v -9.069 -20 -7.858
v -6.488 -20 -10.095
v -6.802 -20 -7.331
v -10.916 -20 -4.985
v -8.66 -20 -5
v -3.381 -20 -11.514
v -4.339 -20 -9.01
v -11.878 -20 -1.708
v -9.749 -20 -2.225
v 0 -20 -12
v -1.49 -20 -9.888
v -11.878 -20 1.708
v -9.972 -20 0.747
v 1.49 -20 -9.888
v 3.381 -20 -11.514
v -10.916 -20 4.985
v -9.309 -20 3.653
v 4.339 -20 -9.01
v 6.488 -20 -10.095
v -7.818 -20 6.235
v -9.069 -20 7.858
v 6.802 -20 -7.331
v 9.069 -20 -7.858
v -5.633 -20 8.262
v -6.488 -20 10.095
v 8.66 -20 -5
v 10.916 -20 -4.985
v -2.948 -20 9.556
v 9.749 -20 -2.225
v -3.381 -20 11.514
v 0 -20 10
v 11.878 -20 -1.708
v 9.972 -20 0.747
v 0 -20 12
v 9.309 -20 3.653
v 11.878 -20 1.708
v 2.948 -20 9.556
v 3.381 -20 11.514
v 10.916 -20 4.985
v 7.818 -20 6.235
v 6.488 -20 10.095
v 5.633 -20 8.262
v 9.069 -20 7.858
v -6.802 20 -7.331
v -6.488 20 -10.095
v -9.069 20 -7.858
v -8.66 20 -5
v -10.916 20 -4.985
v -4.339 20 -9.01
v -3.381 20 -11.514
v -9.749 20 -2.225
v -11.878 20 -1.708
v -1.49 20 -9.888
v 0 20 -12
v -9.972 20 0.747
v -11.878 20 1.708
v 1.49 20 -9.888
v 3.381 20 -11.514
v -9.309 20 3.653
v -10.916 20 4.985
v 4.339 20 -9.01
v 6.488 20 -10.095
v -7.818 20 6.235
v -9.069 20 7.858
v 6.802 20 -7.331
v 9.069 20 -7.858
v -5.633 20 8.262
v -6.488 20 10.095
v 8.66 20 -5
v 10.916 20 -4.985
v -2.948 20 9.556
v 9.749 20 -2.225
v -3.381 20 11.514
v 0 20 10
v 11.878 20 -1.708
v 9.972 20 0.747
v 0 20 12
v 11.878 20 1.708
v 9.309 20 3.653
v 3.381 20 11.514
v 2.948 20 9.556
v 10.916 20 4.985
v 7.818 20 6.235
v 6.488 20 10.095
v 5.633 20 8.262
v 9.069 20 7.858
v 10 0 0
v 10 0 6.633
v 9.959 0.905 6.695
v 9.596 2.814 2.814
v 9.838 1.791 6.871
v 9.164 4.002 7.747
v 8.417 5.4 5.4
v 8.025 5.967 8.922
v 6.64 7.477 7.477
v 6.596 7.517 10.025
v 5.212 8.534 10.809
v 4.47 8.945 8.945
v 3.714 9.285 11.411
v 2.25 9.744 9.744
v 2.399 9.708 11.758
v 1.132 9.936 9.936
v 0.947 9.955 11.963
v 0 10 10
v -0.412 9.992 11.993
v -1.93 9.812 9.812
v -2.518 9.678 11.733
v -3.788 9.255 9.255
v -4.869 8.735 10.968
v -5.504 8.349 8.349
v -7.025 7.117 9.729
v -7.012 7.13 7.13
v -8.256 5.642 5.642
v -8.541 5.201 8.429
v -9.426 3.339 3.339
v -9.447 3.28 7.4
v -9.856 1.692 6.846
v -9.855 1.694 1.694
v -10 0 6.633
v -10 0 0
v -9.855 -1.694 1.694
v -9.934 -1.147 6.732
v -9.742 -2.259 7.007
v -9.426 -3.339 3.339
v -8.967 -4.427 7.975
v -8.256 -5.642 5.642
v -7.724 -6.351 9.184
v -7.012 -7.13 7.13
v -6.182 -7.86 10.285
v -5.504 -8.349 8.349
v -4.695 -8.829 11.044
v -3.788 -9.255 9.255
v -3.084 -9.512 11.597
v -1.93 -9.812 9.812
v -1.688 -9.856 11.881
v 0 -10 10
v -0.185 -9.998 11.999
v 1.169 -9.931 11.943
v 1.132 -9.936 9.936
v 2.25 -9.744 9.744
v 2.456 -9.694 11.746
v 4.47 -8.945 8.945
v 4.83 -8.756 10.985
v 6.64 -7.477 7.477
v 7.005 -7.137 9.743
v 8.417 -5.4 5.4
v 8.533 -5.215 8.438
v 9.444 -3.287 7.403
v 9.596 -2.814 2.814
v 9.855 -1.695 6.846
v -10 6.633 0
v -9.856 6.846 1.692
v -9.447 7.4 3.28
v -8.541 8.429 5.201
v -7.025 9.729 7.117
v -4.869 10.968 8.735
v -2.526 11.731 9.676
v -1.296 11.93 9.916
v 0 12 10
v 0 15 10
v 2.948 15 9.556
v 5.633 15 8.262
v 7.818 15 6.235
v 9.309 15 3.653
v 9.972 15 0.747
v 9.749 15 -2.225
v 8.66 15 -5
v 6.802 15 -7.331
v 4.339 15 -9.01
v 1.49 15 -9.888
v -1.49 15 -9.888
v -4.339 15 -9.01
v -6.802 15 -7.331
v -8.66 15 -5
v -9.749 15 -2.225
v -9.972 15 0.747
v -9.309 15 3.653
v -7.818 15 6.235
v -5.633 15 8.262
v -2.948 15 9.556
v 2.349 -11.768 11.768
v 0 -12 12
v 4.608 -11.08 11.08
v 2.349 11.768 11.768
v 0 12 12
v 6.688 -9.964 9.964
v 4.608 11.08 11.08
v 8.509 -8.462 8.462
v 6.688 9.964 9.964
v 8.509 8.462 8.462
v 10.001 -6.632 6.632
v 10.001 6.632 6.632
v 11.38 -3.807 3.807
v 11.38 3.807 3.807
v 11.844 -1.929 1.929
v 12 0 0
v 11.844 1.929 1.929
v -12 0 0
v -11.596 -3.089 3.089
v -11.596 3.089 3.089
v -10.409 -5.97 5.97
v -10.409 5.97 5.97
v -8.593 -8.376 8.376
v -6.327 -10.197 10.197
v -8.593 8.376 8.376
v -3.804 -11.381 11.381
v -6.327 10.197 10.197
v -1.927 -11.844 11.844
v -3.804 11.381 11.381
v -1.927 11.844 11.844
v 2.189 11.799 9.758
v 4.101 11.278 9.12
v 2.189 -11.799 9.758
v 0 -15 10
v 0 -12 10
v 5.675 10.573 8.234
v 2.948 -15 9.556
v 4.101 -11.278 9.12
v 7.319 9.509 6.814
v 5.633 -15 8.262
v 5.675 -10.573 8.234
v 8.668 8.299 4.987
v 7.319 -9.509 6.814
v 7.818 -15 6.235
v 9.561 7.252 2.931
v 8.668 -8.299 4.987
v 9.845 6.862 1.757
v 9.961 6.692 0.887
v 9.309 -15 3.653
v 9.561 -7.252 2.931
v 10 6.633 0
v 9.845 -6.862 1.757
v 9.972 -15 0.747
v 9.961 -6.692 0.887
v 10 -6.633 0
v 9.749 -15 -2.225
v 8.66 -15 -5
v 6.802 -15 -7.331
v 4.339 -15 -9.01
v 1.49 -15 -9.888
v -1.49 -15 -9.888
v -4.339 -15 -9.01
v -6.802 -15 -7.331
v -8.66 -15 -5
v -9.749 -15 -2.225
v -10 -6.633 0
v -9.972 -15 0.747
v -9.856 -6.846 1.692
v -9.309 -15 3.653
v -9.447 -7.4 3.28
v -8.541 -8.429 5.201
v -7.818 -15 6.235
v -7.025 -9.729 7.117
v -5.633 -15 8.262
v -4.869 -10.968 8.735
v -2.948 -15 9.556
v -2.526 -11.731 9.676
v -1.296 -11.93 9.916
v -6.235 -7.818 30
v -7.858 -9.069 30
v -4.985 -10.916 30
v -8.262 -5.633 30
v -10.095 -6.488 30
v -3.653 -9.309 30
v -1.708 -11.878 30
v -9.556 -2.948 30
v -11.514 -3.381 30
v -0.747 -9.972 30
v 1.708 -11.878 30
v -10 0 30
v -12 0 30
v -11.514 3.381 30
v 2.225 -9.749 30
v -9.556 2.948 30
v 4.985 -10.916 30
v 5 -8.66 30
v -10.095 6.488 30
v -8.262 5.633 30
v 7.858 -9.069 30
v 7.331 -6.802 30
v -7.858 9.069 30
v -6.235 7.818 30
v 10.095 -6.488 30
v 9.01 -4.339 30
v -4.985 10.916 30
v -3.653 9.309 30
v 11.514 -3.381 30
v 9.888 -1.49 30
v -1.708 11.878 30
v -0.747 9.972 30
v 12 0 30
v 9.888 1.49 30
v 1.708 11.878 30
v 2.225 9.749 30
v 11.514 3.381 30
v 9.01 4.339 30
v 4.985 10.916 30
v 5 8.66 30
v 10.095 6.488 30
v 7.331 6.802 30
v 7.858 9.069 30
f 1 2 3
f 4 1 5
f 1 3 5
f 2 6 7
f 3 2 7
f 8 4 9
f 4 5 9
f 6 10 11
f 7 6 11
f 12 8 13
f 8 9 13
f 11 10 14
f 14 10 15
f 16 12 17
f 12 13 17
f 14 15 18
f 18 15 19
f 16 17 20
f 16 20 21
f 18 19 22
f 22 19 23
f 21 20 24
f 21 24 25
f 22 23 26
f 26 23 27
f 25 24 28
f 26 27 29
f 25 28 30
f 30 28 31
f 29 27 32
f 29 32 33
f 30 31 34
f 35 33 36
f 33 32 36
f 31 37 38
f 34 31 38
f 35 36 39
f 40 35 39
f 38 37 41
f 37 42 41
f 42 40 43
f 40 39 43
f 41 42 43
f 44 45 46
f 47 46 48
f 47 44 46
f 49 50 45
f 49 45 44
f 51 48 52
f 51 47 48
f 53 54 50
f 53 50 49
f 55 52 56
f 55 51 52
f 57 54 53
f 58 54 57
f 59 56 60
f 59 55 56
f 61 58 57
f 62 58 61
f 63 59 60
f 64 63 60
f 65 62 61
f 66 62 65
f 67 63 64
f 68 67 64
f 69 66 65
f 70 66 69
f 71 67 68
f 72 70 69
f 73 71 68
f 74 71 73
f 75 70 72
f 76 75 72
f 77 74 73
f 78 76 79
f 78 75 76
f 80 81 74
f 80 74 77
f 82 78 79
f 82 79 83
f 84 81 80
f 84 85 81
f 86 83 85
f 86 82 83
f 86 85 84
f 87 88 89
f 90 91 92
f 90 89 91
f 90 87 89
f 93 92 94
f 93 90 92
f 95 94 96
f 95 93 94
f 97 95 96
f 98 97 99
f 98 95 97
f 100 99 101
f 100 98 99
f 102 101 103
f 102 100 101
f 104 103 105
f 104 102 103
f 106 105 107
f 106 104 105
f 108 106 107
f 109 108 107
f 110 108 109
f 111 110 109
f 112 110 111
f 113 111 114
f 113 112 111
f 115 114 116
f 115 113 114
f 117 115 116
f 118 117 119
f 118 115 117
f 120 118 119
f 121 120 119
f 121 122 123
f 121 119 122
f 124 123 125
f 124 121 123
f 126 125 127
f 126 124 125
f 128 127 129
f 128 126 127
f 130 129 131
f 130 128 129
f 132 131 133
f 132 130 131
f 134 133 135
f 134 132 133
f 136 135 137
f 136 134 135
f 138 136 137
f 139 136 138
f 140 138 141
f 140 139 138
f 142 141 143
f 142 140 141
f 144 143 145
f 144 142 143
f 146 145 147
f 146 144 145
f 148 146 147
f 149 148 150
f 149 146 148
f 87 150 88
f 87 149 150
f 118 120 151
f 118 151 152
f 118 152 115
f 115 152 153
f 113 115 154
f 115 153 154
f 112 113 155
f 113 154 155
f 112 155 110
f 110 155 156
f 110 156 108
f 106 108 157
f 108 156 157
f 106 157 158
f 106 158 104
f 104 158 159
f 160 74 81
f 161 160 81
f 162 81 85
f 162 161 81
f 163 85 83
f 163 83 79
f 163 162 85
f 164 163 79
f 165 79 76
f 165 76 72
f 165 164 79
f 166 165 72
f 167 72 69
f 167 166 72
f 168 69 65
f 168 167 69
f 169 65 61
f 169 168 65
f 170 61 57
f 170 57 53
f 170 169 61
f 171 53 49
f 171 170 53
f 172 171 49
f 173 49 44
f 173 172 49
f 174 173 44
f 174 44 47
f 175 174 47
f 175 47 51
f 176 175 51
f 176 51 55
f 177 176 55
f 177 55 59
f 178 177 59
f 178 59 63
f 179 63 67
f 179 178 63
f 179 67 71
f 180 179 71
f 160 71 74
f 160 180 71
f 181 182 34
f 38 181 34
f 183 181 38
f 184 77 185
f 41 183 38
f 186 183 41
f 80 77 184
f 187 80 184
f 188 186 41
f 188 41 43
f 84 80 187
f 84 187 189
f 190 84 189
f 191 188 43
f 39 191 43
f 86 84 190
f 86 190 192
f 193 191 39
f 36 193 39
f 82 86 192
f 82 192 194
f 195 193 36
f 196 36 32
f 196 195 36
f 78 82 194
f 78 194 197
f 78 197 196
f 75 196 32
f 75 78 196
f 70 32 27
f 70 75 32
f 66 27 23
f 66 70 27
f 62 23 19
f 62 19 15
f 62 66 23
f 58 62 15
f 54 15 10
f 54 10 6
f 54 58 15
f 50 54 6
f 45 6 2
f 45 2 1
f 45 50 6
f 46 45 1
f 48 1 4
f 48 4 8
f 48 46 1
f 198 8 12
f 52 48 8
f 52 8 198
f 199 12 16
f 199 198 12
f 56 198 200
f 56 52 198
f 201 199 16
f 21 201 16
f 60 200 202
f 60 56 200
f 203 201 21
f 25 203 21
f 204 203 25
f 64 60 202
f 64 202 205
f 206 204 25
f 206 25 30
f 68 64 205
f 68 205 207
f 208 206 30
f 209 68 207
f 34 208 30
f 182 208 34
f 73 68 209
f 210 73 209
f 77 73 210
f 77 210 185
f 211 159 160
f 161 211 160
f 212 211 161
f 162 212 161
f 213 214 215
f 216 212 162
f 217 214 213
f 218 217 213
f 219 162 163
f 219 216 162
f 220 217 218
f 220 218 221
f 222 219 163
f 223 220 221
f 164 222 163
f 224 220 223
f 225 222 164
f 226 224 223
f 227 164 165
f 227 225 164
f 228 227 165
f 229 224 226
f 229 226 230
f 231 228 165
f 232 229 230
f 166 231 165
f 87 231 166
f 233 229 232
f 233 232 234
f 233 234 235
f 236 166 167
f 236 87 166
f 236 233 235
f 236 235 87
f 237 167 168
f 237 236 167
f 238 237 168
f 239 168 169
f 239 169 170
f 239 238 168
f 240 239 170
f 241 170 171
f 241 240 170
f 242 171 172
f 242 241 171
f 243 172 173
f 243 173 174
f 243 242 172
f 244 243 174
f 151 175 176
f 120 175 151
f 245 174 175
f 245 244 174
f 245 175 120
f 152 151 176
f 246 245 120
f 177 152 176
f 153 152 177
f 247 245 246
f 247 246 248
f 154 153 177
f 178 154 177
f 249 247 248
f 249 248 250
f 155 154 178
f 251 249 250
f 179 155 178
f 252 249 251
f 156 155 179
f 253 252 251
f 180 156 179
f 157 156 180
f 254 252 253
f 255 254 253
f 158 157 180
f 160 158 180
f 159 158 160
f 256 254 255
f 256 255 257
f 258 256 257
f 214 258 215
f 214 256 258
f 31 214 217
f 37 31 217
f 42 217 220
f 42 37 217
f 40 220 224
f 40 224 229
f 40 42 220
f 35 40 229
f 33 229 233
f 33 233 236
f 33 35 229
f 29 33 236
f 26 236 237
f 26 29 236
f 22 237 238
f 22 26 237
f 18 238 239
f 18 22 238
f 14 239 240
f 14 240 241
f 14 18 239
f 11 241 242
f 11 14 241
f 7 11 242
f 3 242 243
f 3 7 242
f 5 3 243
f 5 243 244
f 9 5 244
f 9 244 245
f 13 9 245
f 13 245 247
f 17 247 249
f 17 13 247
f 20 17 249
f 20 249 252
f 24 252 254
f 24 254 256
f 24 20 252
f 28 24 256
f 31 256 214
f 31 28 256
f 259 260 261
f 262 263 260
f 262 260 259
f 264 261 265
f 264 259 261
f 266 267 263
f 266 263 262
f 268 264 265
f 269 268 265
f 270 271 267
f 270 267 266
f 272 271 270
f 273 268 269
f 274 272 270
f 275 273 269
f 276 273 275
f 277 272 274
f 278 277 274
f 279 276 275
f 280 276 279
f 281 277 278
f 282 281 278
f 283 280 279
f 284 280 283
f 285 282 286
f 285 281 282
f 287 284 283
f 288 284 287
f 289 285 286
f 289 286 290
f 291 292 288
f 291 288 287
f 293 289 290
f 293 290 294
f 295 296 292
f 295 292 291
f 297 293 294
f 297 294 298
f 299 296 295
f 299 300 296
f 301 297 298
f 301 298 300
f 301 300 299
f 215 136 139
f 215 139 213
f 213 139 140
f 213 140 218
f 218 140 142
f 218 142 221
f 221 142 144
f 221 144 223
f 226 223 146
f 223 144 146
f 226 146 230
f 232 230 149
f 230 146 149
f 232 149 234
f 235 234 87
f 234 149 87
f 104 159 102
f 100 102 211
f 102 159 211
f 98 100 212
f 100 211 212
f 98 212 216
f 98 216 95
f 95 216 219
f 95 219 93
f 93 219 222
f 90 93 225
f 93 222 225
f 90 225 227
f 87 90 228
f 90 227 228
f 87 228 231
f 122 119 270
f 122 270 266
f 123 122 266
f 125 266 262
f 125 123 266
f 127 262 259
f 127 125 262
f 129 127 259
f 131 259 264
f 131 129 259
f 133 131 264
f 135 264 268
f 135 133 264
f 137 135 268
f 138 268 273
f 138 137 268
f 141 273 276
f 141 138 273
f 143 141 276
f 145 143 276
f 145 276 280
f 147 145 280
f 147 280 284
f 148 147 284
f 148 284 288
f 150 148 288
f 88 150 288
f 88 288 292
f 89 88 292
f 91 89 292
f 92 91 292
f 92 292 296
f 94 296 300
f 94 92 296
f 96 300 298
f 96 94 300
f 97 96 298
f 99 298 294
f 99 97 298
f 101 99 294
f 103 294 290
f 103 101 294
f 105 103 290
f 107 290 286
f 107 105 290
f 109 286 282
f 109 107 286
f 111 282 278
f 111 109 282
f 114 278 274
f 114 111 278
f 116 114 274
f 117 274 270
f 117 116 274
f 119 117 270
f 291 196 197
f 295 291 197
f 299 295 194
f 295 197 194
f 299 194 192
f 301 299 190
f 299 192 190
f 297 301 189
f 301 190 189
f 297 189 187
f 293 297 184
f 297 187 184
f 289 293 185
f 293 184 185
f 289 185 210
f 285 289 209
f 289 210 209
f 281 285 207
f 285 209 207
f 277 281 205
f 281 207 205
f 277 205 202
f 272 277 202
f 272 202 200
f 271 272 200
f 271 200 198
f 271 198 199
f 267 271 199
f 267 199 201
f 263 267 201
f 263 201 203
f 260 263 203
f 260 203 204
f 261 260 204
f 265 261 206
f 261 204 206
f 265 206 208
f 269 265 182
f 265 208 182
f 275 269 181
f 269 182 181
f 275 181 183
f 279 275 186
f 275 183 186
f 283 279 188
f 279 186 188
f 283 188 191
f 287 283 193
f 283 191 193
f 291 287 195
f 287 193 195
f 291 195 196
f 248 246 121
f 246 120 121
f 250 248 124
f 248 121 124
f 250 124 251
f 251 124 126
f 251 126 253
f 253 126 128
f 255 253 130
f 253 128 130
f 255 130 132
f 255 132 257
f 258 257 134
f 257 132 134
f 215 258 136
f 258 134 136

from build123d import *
from build123d.topology import SkipClean

# Parameters (mm, degrees)
SKETCH_1_R          = 12
SKETCH_1_R_2        = 10
EXTRUDE_1_DEPTH     = 20
SKETCH_2_R          = 12
SKETCH_2_R_2        = 10
EXTRUDE_2_DEPTH     = 30
SKETCH_2_2_R        = 10
CUT_EXTRUDE_1_DEPTH = 30
SKETCH_1_2_R        = 10
CUT_EXTRUDE_2_DEPTH = 15


with BuildPart() as part:
    # 草图1 → 凸台-拉伸1 (new, symmetric)
    with BuildSketch(Plane(origin=(0, 0, 0), x_dir=(1, 0, 0), z_dir=(0, 1, 0))):
        Circle(SKETCH_1_R)
        Circle(SKETCH_1_R_2, mode=Mode.SUBTRACT)
    extrude(amount=EXTRUDE_1_DEPTH, both=True)

    # 草图2 → 凸台-拉伸2 (add)
    with BuildSketch(Plane.XY):
        Circle(SKETCH_2_R)
        Circle(SKETCH_2_R_2, mode=Mode.SUBTRACT)
    extrude(amount=EXTRUDE_2_DEPTH)

    # 草图2<2> → 切除-拉伸1 (cut)
    with BuildSketch(Plane.XY):
        Circle(SKETCH_2_2_R)
    extrude(amount=CUT_EXTRUDE_1_DEPTH, mode=Mode.SUBTRACT)

    # 草图1<2> → 切除-拉伸2 (cut, symmetric)
    with SkipClean():  # the faces are left unmerged after this step: merging them gives an invalid solid
        with BuildSketch(Plane(origin=(0, 0, 0), x_dir=(1, 0, 0), z_dir=(0, 1, 0))):
            Circle(SKETCH_1_2_R)
        extrude(amount=CUT_EXTRUDE_2_DEPTH, both=True, mode=Mode.SUBTRACT)


solid = part.part
